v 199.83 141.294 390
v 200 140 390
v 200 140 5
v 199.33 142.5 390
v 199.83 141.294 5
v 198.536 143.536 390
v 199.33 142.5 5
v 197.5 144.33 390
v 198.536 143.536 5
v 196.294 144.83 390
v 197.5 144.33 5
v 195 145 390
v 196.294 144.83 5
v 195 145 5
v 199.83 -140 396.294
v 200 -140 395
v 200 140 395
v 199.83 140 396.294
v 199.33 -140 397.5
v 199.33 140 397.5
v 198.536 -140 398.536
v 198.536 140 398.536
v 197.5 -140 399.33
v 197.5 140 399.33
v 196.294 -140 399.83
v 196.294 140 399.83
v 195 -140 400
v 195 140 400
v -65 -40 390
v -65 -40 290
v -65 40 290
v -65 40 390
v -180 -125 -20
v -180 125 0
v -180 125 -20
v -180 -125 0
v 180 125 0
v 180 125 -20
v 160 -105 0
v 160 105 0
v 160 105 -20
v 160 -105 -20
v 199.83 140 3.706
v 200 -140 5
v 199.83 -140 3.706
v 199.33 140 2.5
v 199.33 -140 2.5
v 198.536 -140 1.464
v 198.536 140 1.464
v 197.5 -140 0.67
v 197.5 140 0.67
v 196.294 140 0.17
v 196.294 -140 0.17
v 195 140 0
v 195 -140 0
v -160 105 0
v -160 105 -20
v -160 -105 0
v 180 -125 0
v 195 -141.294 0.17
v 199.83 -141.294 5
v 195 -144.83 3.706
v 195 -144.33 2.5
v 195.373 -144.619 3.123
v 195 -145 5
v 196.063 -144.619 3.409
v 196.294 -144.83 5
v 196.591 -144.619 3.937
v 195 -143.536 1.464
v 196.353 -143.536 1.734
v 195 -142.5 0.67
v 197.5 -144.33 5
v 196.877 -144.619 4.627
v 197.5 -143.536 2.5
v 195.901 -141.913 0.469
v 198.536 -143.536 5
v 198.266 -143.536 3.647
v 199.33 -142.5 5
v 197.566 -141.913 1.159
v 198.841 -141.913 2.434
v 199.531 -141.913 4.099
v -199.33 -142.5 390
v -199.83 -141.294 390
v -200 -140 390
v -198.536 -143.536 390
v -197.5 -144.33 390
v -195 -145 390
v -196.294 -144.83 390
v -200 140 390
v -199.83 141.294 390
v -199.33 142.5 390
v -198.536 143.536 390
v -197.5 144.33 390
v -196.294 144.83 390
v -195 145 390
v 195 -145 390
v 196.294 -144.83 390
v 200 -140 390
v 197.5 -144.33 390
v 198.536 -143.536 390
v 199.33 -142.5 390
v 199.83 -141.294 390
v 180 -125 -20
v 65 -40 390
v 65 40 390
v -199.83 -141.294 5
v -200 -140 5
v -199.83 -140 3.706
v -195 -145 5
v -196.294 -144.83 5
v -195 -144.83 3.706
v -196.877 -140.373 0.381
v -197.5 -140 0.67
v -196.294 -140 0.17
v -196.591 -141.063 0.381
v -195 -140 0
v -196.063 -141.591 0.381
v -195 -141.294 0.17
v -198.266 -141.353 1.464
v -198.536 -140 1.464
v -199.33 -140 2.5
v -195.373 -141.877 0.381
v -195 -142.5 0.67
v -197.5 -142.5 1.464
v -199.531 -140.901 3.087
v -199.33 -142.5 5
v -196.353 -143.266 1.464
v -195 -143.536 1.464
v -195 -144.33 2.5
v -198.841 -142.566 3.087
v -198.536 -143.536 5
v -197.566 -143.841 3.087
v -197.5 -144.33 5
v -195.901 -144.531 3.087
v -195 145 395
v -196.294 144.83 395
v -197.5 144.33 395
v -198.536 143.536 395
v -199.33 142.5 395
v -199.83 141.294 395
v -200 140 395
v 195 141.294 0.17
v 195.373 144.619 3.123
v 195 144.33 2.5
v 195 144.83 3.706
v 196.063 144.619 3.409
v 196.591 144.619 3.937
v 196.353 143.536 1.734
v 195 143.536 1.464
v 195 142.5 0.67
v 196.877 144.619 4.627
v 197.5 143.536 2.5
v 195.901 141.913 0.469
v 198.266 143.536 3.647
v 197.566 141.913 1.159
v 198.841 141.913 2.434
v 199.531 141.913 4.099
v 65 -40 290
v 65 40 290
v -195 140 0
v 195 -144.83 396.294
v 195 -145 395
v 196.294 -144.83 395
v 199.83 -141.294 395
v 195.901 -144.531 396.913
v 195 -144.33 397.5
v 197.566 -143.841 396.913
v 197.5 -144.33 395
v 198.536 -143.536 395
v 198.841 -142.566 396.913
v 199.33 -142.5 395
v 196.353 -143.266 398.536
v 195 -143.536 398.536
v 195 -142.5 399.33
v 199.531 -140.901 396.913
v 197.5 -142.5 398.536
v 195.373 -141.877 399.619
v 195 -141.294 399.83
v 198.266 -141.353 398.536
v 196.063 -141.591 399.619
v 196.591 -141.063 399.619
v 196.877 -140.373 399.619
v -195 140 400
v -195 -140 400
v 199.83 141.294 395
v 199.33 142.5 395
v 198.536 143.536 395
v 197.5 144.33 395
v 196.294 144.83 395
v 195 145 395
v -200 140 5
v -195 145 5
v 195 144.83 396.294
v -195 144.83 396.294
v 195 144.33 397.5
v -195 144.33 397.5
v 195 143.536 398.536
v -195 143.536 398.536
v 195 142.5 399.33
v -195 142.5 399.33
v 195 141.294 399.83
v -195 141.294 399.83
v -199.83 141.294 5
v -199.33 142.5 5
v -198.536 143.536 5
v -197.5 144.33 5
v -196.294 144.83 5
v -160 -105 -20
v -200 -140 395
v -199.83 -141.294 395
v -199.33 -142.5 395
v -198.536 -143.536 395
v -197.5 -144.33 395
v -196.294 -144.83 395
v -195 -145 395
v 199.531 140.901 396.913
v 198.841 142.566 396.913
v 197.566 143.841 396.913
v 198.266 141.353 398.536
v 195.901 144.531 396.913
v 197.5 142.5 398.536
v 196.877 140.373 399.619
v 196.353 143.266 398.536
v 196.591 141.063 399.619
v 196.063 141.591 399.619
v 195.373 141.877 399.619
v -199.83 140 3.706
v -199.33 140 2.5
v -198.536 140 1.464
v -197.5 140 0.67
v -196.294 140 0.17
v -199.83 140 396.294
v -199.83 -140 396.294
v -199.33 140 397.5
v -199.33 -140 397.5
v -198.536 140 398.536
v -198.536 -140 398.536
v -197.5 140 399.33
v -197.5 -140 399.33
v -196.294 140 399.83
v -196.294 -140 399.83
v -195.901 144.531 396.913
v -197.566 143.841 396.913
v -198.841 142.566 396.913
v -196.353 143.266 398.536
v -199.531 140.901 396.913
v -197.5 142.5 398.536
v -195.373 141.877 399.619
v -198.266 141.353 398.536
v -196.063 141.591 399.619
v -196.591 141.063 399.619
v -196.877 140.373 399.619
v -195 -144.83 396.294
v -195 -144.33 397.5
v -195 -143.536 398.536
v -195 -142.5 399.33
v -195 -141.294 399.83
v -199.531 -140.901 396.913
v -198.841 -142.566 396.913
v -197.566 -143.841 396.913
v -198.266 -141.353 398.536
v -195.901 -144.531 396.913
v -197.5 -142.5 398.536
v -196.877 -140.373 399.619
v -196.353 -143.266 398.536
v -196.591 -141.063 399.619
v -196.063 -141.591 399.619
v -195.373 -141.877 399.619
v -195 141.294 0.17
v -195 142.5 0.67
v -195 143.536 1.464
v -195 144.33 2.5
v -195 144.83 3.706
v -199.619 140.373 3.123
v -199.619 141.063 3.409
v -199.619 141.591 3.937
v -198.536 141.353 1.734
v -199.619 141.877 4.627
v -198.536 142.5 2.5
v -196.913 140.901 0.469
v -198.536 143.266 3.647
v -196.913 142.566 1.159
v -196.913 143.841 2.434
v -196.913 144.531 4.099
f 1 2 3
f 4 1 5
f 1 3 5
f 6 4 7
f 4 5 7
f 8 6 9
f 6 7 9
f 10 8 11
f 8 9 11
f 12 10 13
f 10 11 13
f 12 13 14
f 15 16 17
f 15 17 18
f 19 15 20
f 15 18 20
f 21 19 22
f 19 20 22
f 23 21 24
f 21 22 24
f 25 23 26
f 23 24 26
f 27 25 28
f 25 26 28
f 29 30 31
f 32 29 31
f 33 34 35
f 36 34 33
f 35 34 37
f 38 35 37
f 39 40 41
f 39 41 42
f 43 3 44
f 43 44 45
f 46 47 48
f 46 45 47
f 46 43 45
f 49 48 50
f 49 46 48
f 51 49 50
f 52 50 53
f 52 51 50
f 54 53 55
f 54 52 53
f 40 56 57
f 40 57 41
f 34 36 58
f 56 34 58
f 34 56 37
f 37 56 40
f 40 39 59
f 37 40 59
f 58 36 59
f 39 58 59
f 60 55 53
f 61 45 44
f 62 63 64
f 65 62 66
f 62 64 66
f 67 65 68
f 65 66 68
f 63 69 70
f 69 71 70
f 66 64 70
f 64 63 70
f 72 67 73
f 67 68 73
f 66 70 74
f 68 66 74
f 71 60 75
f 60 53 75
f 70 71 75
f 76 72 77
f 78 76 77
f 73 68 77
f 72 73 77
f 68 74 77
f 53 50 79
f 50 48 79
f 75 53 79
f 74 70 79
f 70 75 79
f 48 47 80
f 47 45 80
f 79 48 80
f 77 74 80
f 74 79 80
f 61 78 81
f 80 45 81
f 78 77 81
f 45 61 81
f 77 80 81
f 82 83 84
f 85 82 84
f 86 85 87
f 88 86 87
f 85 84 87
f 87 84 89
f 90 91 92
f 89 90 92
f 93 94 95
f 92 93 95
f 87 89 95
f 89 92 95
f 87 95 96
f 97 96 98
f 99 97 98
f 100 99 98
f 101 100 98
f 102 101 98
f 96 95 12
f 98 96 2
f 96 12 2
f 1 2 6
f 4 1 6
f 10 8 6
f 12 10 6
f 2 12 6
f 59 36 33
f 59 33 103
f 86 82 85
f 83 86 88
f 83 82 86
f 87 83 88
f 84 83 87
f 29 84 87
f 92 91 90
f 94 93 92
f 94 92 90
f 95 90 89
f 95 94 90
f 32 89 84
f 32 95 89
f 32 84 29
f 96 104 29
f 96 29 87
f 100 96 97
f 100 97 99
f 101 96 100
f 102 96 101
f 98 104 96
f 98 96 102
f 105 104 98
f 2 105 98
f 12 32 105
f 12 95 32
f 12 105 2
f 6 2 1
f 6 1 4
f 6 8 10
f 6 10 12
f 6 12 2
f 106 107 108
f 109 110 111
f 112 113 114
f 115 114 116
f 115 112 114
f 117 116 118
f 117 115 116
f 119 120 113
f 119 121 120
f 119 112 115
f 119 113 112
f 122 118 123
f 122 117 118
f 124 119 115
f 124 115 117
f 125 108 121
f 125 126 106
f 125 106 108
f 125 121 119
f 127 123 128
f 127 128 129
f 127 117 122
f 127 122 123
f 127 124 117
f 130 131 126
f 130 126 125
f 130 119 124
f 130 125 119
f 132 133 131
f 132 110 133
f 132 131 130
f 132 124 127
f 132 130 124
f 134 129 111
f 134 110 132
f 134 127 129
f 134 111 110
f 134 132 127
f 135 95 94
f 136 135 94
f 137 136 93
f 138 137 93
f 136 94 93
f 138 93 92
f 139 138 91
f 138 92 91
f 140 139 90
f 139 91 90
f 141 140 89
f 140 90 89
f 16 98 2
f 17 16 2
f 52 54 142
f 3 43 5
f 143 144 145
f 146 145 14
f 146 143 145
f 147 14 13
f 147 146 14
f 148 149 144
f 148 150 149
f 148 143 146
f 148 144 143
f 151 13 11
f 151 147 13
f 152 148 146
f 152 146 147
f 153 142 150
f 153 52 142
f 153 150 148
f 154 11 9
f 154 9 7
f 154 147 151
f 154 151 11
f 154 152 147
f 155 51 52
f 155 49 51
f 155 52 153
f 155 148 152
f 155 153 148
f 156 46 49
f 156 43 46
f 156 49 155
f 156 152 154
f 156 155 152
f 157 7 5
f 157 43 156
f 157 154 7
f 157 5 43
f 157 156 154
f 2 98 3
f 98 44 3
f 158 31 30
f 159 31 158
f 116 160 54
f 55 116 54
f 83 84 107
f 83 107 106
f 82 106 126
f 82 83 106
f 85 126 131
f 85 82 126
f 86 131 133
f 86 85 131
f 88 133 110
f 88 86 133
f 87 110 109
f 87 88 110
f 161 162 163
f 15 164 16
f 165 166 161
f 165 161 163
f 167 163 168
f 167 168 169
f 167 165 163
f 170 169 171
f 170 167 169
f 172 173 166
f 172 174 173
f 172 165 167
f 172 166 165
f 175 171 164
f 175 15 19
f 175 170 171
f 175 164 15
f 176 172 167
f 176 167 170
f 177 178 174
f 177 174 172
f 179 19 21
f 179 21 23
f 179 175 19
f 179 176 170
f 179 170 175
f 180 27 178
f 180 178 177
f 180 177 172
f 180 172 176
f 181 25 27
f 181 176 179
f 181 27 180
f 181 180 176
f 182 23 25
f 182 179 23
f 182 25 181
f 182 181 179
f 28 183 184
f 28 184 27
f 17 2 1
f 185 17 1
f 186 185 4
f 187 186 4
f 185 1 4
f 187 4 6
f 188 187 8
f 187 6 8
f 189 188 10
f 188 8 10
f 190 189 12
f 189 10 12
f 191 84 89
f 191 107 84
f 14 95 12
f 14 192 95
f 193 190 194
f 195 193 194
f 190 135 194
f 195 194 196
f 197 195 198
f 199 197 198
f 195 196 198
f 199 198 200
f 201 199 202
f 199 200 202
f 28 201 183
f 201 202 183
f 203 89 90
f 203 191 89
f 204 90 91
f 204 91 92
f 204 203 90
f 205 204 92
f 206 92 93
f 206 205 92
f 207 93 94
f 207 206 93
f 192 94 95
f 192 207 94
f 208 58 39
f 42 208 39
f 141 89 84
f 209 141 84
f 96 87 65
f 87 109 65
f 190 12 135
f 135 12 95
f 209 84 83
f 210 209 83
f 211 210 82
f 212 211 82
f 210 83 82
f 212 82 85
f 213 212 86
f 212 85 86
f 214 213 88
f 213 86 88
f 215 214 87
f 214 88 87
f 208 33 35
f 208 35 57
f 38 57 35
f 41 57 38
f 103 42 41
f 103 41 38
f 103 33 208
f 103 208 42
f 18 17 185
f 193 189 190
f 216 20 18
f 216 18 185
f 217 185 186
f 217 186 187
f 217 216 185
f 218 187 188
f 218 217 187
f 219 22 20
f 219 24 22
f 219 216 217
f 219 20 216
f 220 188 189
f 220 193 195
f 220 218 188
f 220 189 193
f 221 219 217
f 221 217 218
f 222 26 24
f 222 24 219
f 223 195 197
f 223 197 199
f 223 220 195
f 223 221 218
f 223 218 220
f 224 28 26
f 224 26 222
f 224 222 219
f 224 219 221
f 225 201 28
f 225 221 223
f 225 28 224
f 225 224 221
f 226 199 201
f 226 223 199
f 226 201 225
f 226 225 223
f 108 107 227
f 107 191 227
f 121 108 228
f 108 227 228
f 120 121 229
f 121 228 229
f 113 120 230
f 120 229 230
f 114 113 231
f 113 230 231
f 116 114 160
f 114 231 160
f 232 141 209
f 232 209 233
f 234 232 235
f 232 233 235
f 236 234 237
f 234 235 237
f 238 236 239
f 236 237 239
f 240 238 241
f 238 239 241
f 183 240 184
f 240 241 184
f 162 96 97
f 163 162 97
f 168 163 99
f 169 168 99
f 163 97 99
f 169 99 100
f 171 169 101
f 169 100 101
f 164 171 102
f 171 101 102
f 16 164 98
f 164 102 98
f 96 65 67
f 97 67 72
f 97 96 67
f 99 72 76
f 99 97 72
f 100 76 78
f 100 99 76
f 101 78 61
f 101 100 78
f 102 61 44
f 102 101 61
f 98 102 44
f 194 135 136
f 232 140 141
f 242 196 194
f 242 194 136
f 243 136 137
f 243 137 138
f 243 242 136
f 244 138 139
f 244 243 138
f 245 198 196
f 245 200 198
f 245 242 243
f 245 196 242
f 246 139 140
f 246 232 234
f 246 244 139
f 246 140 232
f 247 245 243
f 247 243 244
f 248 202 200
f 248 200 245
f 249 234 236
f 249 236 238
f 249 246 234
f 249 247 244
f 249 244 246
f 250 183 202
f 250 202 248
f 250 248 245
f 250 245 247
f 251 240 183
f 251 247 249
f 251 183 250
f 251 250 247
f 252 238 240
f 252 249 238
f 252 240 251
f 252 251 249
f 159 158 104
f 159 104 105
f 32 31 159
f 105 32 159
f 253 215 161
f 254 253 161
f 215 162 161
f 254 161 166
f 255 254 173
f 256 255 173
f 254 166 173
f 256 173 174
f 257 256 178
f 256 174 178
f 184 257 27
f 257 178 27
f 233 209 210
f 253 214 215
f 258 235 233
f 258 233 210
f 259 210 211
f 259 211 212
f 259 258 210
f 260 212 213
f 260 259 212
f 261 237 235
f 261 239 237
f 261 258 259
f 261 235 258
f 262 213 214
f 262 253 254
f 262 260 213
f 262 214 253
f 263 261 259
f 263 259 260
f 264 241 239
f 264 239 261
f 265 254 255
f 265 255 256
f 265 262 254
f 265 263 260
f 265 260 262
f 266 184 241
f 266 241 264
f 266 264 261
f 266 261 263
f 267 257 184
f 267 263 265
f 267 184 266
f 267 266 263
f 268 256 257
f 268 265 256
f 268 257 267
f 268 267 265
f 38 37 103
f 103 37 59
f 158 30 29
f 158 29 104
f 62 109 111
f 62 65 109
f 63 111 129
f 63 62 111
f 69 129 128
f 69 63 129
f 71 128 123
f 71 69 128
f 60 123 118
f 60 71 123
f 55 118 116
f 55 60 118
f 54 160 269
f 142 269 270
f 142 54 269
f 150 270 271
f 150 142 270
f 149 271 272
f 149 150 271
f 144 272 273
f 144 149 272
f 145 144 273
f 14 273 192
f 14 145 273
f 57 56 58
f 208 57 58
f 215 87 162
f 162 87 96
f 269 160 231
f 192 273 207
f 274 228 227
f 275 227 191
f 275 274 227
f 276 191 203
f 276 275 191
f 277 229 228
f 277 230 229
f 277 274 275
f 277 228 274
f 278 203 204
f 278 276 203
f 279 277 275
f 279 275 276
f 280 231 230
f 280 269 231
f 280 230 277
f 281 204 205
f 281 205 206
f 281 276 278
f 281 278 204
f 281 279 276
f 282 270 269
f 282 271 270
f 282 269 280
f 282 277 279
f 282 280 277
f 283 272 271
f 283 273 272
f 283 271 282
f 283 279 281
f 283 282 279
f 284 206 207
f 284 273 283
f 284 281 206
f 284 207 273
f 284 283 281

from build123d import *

# Parameters (mm, degrees)
F0_W     = 400
F0_H     = 290
F1_DEPTH = 290
F2_W     = 400
F2_H     = 290
F2_W_2   = 130
F2_H_2   = 80
F3_DEPTH = 100
F4_R     = 5
F5_W     = 360
F5_H     = 250
F5_W_2   = 320
F5_H_2   = 210
F6_DEPTH = 20
F7_W     = 130
F7_H     = 80
F8_DEPTH = 10
F9_R     = 5


with BuildPart() as f1:
    # F0 (on Top) → F1 (new body)
    with BuildSketch(Plane.XY):
        Rectangle(F0_W, F0_H)
    extrude(amount=F1_DEPTH)

    # F2 (on face) → F3 (join)
    with BuildSketch(Plane.XY.offset(290)):
        Rectangle(F2_W, F2_H)
        Rectangle(F2_W_2, F2_H_2, mode=Mode.SUBTRACT)
    extrude(amount=F3_DEPTH)

    # F4
    f4_edges = [f1.edges().sort_by_distance(p)[0] for p in [
        (-200, -145, 195),
        (200, 0, 0),
        (0, 145, 0),
        (-200, 0, 0),
        (0, -145, 0),
        (-200, 145, 195),
        (200, 145, 195),
        (200, -145, 195),
    ]]
    fillet(f4_edges, radius=F4_R)


with BuildPart() as f6:
    # F5 (on face) → F6 (new body)
    with BuildSketch(Plane(origin=(0, 0, 0), x_dir=(1, 0, 0), z_dir=(0, 0, -1))):
        Rectangle(F5_W, F5_H)
        Rectangle(F5_W_2, F5_H_2, mode=Mode.SUBTRACT)
    extrude(amount=F6_DEPTH)


with BuildPart() as f8:
    # F7 (on face) → F8 (new body)
    with BuildSketch(Plane.XY.offset(390)):
        with BuildLine():
            ThreePointArc((-200, -140), (-198.5355339059, -143.5355339059), (-195, -145))
            Line((-195, -145), (195, -145))
            ThreePointArc((195, -145), (198.5355339059, -143.5355339059), (200, -140))
            Line((200, -140), (200, 140))
            ThreePointArc((200, 140), (198.5355339059, 143.5355339059), (195, 145))
            Line((195, 145), (-195, 145))
            ThreePointArc((-195, 145), (-198.5355339059, 143.5355339059), (-200, 140))
            Line((-200, 140), (-200, -140))
        make_face()
        Rectangle(F7_W, F7_H, mode=Mode.SUBTRACT)
        Rectangle(F7_W, F7_H)
    extrude(amount=F8_DEPTH)

    # F9
    f9_edges = [f8.edges().sort_by_distance(p)[0] for p in [
        (-200, 0, 400),
        (0, 145, 400),
    ]]
    fillet(f9_edges, radius=F9_R)


solid = Compound([f1.part, f6.part, f8.part])
